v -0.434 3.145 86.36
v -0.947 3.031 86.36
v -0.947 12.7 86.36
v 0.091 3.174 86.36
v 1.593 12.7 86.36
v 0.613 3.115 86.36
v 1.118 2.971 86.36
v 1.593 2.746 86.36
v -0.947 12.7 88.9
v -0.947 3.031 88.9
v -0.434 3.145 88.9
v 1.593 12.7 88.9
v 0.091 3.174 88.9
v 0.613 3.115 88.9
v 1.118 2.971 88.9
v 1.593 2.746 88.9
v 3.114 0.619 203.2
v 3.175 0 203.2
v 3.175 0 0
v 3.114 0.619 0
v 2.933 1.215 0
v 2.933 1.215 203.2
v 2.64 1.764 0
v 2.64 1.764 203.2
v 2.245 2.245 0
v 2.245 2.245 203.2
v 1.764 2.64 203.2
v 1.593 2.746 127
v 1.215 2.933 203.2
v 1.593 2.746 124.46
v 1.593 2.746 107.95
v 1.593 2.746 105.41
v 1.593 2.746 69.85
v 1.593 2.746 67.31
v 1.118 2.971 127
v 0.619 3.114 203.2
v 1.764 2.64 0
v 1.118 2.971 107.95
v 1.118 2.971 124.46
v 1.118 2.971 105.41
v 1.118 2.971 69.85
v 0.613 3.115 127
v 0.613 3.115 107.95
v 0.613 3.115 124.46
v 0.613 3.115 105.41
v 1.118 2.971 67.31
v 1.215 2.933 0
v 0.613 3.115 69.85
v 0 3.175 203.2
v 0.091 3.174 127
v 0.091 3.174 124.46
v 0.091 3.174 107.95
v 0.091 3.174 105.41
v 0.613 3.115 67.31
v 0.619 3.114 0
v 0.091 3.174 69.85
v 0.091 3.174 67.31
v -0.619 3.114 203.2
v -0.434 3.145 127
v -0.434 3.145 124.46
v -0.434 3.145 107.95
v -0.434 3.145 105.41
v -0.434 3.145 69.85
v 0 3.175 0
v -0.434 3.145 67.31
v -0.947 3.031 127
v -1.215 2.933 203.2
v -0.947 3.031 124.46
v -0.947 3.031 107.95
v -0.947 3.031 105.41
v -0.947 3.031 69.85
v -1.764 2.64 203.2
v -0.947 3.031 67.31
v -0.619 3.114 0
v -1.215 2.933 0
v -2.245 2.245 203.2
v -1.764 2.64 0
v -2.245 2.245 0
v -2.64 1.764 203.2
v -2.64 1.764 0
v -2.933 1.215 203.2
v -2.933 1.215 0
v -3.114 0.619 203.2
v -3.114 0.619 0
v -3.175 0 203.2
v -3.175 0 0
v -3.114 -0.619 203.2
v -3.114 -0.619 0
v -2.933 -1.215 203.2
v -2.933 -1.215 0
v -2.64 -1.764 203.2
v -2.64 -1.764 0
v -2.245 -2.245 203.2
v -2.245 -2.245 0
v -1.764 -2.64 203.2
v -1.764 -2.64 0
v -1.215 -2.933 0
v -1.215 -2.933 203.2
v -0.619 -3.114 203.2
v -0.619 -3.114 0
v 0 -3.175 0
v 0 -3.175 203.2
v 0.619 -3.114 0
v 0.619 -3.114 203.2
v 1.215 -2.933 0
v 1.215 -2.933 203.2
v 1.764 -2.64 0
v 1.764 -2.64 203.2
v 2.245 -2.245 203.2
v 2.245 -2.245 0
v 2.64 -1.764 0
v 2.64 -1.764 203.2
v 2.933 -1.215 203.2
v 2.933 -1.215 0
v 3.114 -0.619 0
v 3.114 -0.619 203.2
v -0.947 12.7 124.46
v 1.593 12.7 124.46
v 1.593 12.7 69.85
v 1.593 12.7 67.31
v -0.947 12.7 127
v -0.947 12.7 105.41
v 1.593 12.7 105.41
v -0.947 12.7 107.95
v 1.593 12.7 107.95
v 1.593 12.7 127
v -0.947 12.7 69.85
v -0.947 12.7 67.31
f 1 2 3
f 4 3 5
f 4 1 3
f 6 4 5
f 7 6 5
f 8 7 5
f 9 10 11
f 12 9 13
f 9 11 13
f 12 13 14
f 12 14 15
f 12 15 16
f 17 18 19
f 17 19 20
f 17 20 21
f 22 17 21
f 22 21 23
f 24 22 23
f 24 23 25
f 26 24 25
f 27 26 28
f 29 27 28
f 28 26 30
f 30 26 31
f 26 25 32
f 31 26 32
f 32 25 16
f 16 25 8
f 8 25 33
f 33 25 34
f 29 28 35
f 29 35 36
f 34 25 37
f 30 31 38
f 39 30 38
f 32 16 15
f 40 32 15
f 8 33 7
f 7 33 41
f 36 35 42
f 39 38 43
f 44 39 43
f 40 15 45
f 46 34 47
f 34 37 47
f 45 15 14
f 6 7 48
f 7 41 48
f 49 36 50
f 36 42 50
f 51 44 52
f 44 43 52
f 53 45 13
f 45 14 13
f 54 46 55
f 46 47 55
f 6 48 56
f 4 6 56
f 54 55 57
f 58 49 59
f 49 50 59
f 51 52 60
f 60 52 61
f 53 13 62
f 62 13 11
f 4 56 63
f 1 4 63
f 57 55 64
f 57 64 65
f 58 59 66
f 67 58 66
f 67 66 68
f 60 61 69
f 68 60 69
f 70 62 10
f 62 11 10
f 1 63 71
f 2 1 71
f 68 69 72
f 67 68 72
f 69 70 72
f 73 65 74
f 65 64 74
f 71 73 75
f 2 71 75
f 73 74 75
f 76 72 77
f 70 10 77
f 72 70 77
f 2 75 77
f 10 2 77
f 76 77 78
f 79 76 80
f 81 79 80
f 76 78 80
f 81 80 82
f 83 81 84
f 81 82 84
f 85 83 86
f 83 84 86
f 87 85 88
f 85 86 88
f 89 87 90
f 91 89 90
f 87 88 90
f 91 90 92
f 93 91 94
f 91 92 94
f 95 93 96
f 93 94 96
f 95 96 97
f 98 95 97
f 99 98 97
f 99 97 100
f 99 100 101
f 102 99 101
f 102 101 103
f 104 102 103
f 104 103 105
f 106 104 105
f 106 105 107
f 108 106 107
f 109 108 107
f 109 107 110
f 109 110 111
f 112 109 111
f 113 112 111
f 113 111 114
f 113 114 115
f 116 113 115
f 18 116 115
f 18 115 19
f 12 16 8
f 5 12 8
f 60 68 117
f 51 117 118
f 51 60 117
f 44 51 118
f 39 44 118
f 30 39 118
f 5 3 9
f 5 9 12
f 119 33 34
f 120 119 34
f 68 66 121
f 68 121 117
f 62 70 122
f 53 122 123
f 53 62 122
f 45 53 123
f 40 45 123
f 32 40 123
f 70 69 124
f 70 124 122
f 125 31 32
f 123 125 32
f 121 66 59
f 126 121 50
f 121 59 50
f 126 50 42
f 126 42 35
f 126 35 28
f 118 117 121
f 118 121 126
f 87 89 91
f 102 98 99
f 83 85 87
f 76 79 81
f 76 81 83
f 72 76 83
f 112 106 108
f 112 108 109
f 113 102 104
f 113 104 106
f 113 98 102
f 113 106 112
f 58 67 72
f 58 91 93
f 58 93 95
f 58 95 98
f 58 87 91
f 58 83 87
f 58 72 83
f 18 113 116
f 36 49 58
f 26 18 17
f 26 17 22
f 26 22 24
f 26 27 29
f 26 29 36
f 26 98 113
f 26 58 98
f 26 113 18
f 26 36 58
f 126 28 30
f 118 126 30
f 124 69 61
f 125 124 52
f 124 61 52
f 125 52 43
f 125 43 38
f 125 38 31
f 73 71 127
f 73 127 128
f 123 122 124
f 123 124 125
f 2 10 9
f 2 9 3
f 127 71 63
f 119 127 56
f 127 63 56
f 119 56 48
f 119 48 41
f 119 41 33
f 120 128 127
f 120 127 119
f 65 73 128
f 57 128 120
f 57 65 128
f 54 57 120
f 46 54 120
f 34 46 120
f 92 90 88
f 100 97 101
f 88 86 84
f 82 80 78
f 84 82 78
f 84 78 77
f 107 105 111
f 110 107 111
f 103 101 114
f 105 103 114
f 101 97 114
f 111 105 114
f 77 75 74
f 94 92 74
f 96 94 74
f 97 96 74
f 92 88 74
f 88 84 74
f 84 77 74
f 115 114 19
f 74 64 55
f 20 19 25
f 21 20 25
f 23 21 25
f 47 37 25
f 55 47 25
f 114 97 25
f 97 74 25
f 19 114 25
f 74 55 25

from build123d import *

# Parameters (mm, degrees)
SKETCH1_R           = 3.175
BOSS_EXTRUDE1_DEPTH = 203.2
SKETCH2_W           = 2.54
SKETCH2_H           = 2.54
BOSS_EXTRUDE2_DEPTH = 12.7


with BuildPart() as part:
    # Sketch1 → Boss-Extrude1 (new body)
    with BuildSketch(Plane.XY):
        Circle(SKETCH1_R)
    extrude(amount=BOSS_EXTRUDE1_DEPTH)

    # Sketch2 → Boss-Extrude2 (add)
    with BuildSketch(Plane(origin=(0, 0, 0), x_dir=(1, 0, 0), z_dir=(0, 1, 0))):
        with Locations((0.323252362, -106.68)):
            Rectangle(SKETCH2_W, SKETCH2_H)
        with Locations((0.323252362, -125.73)):
            Rectangle(SKETCH2_W, SKETCH2_H)
        with Locations((0.323252362, -87.63)):
            Rectangle(SKETCH2_W, SKETCH2_H)
        with Locations((0.323252362, -68.58)):
            Rectangle(SKETCH2_W, SKETCH2_H)
    extrude(amount=BOSS_EXTRUDE2_DEPTH)


solid = part.part
